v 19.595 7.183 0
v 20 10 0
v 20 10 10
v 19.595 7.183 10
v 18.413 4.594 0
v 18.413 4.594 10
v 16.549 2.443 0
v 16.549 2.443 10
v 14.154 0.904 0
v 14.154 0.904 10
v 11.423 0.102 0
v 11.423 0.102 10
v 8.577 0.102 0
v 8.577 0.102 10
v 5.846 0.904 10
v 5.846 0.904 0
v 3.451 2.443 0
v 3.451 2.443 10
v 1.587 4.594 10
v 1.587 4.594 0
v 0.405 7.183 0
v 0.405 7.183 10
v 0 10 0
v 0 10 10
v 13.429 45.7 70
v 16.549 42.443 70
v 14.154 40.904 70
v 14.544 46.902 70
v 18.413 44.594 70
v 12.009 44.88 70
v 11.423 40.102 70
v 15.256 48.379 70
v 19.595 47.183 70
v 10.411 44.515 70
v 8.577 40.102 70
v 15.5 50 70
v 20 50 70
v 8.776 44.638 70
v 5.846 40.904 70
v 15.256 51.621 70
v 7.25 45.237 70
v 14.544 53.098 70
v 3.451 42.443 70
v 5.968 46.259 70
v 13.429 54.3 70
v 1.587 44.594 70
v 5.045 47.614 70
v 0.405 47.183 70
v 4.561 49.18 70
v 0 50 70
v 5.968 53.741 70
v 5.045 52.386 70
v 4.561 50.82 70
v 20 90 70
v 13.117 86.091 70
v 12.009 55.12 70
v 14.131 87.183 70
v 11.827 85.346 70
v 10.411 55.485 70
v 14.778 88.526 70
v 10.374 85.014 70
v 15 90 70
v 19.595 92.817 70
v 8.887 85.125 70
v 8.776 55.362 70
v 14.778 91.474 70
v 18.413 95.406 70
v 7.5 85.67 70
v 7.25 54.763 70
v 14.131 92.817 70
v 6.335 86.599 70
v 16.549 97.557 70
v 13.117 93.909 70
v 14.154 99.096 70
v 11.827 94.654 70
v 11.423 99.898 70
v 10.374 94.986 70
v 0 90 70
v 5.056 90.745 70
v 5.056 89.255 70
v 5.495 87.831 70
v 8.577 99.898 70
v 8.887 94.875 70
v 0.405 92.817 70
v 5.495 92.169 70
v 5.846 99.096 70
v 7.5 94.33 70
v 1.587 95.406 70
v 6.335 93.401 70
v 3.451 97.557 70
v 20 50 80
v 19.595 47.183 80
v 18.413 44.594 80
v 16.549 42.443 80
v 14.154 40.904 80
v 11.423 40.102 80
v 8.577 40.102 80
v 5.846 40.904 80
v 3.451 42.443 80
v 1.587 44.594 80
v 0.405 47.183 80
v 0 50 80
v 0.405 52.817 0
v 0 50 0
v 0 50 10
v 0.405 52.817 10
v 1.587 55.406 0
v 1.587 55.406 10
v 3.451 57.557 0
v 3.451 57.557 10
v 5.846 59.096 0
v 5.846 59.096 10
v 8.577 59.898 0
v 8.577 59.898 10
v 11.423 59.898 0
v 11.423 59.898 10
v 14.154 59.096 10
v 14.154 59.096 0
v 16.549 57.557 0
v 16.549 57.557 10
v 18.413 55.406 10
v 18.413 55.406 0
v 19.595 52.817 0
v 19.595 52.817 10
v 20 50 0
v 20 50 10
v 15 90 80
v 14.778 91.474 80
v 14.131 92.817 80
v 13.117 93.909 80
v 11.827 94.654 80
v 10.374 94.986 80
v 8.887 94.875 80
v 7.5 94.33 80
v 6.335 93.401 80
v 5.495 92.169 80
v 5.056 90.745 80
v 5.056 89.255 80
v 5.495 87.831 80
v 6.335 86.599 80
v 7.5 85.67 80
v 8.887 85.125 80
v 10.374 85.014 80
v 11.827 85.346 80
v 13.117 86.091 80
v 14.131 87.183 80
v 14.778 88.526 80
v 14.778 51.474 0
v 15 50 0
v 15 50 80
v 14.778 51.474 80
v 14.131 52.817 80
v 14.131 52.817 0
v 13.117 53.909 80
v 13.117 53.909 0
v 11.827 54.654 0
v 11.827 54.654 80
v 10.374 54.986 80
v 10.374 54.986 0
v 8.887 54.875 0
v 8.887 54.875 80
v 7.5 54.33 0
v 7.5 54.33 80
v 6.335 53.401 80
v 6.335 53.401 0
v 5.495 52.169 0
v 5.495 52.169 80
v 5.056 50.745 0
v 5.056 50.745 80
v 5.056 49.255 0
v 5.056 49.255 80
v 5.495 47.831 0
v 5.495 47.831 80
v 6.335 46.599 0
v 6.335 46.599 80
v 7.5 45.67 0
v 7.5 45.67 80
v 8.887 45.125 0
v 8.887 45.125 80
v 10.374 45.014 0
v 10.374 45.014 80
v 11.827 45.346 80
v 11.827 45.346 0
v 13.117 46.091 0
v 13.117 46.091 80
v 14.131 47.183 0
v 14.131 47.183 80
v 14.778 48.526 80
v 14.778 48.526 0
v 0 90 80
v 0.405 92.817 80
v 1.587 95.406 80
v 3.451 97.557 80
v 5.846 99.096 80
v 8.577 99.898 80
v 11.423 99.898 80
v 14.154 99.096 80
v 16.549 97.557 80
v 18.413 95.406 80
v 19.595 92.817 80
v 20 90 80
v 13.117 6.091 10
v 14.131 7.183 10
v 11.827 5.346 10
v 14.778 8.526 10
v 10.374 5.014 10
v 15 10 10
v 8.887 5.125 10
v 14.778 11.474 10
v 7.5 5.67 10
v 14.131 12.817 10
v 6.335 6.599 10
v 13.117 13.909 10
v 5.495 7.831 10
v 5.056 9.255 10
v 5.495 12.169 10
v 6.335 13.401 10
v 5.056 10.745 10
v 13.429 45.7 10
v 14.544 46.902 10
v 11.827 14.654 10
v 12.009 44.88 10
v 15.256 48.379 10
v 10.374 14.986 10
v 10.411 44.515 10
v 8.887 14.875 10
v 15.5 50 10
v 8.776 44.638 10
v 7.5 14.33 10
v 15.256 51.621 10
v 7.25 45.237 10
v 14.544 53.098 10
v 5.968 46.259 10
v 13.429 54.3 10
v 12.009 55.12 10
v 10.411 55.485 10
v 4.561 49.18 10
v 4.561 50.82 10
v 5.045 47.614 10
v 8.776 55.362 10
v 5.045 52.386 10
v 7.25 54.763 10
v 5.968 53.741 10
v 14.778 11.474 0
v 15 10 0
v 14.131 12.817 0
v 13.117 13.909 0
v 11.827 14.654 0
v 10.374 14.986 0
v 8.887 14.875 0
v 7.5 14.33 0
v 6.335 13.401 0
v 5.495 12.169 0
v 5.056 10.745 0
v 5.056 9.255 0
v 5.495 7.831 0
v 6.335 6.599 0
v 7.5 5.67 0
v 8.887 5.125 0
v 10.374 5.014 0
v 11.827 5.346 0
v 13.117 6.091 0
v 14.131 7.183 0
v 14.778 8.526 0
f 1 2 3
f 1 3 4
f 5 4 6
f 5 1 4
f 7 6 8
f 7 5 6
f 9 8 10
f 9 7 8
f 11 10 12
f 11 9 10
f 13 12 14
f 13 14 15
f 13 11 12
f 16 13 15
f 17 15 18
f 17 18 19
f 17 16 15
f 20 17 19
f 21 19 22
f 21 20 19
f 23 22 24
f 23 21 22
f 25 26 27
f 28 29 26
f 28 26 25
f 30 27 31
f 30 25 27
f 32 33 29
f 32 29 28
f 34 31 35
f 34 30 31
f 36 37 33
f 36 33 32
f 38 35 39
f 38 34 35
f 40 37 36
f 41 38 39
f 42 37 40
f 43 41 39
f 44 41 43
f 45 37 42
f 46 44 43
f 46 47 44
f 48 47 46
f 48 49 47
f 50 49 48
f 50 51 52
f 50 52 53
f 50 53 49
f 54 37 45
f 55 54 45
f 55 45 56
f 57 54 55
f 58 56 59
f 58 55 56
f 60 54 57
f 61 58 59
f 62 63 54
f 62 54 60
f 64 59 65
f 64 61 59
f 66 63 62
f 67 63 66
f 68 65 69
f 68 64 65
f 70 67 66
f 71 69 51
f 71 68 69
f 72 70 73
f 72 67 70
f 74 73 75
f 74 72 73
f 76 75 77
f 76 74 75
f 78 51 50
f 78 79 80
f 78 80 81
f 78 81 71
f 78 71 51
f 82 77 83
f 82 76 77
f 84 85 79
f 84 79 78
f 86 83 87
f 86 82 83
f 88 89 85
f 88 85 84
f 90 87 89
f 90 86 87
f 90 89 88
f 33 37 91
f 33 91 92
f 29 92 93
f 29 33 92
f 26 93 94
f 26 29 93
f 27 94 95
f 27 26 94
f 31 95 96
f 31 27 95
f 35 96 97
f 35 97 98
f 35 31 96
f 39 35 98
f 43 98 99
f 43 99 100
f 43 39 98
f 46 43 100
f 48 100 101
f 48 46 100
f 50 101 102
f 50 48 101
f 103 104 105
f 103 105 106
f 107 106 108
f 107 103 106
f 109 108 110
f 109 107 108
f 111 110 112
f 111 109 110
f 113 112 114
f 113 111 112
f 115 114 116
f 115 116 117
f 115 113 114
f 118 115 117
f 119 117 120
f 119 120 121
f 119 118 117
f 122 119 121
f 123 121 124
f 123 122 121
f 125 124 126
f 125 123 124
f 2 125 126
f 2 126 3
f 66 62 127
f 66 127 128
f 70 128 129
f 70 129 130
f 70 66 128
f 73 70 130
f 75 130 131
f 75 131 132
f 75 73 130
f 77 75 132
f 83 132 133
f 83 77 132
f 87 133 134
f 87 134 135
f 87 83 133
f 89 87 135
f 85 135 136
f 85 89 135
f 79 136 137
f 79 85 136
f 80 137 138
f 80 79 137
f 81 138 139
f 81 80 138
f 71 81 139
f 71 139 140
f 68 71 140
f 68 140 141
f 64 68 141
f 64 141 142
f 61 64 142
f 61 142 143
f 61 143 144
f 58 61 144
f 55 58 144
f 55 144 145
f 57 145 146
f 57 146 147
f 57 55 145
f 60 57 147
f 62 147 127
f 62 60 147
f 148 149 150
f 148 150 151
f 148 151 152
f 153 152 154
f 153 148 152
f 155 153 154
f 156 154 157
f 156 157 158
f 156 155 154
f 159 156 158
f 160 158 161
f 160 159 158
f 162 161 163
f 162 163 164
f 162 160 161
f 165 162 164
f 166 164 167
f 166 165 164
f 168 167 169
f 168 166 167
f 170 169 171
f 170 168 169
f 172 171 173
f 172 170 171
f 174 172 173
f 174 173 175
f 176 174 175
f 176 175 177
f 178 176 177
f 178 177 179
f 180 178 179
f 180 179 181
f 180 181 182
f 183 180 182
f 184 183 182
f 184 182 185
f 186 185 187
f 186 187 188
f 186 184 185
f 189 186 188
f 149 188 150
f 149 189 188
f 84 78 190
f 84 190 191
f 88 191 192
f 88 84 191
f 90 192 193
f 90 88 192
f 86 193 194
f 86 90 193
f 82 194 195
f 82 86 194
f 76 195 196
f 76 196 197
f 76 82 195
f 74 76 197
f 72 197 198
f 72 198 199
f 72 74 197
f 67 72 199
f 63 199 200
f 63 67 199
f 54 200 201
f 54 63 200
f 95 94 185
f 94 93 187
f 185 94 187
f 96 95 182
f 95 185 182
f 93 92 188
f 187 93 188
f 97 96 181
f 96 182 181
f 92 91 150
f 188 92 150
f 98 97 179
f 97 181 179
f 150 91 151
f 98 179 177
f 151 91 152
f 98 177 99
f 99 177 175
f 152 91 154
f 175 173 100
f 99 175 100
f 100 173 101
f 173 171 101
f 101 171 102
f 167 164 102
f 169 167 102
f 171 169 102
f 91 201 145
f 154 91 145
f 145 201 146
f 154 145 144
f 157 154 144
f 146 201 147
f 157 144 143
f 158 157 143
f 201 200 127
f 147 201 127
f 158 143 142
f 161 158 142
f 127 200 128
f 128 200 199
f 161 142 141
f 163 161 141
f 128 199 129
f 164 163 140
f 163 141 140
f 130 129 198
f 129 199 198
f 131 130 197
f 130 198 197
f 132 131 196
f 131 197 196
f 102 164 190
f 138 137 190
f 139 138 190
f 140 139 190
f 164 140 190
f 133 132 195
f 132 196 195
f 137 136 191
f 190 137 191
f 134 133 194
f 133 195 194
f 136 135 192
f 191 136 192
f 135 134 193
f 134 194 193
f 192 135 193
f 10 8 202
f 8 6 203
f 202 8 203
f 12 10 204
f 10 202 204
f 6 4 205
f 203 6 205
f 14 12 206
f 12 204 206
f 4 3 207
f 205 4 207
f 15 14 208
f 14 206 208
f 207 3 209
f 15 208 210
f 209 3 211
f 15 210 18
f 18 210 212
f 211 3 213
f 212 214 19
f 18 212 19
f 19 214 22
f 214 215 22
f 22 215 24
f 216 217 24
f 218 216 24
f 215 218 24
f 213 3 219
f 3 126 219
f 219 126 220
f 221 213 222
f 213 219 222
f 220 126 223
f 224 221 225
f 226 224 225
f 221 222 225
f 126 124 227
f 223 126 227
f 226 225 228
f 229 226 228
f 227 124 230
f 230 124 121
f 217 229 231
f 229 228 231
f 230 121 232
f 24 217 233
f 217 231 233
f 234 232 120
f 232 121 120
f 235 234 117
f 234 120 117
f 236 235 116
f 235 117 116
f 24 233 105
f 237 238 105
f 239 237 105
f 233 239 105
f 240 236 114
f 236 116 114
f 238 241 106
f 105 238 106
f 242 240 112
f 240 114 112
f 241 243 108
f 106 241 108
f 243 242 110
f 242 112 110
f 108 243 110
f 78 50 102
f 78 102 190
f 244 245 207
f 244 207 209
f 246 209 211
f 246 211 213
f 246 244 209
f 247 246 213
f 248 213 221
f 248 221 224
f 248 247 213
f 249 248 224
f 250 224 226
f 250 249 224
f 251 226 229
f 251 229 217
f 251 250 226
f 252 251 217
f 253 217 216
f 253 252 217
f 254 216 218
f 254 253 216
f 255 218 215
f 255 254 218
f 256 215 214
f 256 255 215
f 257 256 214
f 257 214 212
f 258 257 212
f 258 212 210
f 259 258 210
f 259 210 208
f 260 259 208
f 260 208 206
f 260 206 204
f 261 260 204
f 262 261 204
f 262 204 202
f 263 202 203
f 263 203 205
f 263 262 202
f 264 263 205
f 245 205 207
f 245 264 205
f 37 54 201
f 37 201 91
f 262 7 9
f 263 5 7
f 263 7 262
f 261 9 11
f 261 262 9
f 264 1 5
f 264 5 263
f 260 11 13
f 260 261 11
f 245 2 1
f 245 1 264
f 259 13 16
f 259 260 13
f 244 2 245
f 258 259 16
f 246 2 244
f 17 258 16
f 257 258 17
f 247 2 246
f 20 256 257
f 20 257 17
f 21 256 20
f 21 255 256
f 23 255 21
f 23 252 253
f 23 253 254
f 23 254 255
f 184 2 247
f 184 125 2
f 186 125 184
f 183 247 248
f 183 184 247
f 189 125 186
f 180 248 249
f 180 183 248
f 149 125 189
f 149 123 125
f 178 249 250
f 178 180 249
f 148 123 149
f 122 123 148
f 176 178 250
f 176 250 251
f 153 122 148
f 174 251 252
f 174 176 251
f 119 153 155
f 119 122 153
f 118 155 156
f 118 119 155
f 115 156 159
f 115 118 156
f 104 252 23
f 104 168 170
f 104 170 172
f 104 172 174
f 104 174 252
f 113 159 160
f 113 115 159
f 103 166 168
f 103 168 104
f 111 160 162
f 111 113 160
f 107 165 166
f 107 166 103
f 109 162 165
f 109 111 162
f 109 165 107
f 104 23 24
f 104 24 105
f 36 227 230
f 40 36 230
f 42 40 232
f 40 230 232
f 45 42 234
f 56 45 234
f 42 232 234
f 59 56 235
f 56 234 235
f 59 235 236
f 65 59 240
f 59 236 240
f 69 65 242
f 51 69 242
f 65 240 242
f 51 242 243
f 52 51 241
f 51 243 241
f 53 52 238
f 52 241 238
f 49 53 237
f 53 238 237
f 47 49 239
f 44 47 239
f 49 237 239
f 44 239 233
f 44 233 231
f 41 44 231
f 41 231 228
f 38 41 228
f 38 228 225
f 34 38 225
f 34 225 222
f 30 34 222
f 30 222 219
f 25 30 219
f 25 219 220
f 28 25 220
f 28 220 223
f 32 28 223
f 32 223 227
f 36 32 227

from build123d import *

# Parameters (mm, degrees)
SKETCH1_R           = 5
SKETCH1_R_2         = 5.5
BOSS_EXTRUDE1_DEPTH = 10
SKETCH1_3_R         = 5.5
SKETCH1_3_R_2       = 5
BOSS_EXTRUDE2_DEPTH = 80
BOSS_EXTRUDE3_START = -10
SKETCH2_R           = 5.5
SKETCH2_R_2         = 5
BOSS_EXTRUDE3_DEPTH = 10


with BuildPart() as part:
    # Sketch1 → Boss-Extrude1 (new body)
    with BuildSketch(Plane.XY):
        with BuildLine():
            Line((0, 50), (0, 10))
            ThreePointArc((0, 10), (10, 0), (20, 10))
            Line((20, 10), (20, 50))
            ThreePointArc((20, 50), (10, 60), (0, 50))
        make_face()
        with Locations((10, 10)):
            Circle(SKETCH1_R, mode=Mode.SUBTRACT)
        with Locations((10, 50)):
            Circle(SKETCH1_R_2, mode=Mode.SUBTRACT)
    extrude(amount=BOSS_EXTRUDE1_DEPTH)

    # Sketch1<3> → Boss-Extrude2 (add)
    with BuildSketch(Plane.XY):
        with Locations((10, 50)):
            Circle(SKETCH1_3_R)
        with Locations((10, 50)):
            Circle(SKETCH1_3_R_2, mode=Mode.SUBTRACT)
    extrude(amount=BOSS_EXTRUDE2_DEPTH)

    # Sketch2 → Boss-Extrude3 (add)
    with BuildSketch(Plane.XY.offset(80).offset(BOSS_EXTRUDE3_START)):
        with BuildLine():
            Line((20, 50), (20, 90))
            ThreePointArc((20, 90), (10, 100), (0, 90))
            Line((0, 90), (0, 50))
            ThreePointArc((0, 50), (10, 40), (20, 50))
        make_face()
        with Locations((10, 50)):
            Circle(SKETCH2_R, mode=Mode.SUBTRACT)
        with Locations((10, 90)):
            Circle(SKETCH2_R_2, mode=Mode.SUBTRACT)
    extrude(amount=BOSS_EXTRUDE3_DEPTH)


solid = part.part
